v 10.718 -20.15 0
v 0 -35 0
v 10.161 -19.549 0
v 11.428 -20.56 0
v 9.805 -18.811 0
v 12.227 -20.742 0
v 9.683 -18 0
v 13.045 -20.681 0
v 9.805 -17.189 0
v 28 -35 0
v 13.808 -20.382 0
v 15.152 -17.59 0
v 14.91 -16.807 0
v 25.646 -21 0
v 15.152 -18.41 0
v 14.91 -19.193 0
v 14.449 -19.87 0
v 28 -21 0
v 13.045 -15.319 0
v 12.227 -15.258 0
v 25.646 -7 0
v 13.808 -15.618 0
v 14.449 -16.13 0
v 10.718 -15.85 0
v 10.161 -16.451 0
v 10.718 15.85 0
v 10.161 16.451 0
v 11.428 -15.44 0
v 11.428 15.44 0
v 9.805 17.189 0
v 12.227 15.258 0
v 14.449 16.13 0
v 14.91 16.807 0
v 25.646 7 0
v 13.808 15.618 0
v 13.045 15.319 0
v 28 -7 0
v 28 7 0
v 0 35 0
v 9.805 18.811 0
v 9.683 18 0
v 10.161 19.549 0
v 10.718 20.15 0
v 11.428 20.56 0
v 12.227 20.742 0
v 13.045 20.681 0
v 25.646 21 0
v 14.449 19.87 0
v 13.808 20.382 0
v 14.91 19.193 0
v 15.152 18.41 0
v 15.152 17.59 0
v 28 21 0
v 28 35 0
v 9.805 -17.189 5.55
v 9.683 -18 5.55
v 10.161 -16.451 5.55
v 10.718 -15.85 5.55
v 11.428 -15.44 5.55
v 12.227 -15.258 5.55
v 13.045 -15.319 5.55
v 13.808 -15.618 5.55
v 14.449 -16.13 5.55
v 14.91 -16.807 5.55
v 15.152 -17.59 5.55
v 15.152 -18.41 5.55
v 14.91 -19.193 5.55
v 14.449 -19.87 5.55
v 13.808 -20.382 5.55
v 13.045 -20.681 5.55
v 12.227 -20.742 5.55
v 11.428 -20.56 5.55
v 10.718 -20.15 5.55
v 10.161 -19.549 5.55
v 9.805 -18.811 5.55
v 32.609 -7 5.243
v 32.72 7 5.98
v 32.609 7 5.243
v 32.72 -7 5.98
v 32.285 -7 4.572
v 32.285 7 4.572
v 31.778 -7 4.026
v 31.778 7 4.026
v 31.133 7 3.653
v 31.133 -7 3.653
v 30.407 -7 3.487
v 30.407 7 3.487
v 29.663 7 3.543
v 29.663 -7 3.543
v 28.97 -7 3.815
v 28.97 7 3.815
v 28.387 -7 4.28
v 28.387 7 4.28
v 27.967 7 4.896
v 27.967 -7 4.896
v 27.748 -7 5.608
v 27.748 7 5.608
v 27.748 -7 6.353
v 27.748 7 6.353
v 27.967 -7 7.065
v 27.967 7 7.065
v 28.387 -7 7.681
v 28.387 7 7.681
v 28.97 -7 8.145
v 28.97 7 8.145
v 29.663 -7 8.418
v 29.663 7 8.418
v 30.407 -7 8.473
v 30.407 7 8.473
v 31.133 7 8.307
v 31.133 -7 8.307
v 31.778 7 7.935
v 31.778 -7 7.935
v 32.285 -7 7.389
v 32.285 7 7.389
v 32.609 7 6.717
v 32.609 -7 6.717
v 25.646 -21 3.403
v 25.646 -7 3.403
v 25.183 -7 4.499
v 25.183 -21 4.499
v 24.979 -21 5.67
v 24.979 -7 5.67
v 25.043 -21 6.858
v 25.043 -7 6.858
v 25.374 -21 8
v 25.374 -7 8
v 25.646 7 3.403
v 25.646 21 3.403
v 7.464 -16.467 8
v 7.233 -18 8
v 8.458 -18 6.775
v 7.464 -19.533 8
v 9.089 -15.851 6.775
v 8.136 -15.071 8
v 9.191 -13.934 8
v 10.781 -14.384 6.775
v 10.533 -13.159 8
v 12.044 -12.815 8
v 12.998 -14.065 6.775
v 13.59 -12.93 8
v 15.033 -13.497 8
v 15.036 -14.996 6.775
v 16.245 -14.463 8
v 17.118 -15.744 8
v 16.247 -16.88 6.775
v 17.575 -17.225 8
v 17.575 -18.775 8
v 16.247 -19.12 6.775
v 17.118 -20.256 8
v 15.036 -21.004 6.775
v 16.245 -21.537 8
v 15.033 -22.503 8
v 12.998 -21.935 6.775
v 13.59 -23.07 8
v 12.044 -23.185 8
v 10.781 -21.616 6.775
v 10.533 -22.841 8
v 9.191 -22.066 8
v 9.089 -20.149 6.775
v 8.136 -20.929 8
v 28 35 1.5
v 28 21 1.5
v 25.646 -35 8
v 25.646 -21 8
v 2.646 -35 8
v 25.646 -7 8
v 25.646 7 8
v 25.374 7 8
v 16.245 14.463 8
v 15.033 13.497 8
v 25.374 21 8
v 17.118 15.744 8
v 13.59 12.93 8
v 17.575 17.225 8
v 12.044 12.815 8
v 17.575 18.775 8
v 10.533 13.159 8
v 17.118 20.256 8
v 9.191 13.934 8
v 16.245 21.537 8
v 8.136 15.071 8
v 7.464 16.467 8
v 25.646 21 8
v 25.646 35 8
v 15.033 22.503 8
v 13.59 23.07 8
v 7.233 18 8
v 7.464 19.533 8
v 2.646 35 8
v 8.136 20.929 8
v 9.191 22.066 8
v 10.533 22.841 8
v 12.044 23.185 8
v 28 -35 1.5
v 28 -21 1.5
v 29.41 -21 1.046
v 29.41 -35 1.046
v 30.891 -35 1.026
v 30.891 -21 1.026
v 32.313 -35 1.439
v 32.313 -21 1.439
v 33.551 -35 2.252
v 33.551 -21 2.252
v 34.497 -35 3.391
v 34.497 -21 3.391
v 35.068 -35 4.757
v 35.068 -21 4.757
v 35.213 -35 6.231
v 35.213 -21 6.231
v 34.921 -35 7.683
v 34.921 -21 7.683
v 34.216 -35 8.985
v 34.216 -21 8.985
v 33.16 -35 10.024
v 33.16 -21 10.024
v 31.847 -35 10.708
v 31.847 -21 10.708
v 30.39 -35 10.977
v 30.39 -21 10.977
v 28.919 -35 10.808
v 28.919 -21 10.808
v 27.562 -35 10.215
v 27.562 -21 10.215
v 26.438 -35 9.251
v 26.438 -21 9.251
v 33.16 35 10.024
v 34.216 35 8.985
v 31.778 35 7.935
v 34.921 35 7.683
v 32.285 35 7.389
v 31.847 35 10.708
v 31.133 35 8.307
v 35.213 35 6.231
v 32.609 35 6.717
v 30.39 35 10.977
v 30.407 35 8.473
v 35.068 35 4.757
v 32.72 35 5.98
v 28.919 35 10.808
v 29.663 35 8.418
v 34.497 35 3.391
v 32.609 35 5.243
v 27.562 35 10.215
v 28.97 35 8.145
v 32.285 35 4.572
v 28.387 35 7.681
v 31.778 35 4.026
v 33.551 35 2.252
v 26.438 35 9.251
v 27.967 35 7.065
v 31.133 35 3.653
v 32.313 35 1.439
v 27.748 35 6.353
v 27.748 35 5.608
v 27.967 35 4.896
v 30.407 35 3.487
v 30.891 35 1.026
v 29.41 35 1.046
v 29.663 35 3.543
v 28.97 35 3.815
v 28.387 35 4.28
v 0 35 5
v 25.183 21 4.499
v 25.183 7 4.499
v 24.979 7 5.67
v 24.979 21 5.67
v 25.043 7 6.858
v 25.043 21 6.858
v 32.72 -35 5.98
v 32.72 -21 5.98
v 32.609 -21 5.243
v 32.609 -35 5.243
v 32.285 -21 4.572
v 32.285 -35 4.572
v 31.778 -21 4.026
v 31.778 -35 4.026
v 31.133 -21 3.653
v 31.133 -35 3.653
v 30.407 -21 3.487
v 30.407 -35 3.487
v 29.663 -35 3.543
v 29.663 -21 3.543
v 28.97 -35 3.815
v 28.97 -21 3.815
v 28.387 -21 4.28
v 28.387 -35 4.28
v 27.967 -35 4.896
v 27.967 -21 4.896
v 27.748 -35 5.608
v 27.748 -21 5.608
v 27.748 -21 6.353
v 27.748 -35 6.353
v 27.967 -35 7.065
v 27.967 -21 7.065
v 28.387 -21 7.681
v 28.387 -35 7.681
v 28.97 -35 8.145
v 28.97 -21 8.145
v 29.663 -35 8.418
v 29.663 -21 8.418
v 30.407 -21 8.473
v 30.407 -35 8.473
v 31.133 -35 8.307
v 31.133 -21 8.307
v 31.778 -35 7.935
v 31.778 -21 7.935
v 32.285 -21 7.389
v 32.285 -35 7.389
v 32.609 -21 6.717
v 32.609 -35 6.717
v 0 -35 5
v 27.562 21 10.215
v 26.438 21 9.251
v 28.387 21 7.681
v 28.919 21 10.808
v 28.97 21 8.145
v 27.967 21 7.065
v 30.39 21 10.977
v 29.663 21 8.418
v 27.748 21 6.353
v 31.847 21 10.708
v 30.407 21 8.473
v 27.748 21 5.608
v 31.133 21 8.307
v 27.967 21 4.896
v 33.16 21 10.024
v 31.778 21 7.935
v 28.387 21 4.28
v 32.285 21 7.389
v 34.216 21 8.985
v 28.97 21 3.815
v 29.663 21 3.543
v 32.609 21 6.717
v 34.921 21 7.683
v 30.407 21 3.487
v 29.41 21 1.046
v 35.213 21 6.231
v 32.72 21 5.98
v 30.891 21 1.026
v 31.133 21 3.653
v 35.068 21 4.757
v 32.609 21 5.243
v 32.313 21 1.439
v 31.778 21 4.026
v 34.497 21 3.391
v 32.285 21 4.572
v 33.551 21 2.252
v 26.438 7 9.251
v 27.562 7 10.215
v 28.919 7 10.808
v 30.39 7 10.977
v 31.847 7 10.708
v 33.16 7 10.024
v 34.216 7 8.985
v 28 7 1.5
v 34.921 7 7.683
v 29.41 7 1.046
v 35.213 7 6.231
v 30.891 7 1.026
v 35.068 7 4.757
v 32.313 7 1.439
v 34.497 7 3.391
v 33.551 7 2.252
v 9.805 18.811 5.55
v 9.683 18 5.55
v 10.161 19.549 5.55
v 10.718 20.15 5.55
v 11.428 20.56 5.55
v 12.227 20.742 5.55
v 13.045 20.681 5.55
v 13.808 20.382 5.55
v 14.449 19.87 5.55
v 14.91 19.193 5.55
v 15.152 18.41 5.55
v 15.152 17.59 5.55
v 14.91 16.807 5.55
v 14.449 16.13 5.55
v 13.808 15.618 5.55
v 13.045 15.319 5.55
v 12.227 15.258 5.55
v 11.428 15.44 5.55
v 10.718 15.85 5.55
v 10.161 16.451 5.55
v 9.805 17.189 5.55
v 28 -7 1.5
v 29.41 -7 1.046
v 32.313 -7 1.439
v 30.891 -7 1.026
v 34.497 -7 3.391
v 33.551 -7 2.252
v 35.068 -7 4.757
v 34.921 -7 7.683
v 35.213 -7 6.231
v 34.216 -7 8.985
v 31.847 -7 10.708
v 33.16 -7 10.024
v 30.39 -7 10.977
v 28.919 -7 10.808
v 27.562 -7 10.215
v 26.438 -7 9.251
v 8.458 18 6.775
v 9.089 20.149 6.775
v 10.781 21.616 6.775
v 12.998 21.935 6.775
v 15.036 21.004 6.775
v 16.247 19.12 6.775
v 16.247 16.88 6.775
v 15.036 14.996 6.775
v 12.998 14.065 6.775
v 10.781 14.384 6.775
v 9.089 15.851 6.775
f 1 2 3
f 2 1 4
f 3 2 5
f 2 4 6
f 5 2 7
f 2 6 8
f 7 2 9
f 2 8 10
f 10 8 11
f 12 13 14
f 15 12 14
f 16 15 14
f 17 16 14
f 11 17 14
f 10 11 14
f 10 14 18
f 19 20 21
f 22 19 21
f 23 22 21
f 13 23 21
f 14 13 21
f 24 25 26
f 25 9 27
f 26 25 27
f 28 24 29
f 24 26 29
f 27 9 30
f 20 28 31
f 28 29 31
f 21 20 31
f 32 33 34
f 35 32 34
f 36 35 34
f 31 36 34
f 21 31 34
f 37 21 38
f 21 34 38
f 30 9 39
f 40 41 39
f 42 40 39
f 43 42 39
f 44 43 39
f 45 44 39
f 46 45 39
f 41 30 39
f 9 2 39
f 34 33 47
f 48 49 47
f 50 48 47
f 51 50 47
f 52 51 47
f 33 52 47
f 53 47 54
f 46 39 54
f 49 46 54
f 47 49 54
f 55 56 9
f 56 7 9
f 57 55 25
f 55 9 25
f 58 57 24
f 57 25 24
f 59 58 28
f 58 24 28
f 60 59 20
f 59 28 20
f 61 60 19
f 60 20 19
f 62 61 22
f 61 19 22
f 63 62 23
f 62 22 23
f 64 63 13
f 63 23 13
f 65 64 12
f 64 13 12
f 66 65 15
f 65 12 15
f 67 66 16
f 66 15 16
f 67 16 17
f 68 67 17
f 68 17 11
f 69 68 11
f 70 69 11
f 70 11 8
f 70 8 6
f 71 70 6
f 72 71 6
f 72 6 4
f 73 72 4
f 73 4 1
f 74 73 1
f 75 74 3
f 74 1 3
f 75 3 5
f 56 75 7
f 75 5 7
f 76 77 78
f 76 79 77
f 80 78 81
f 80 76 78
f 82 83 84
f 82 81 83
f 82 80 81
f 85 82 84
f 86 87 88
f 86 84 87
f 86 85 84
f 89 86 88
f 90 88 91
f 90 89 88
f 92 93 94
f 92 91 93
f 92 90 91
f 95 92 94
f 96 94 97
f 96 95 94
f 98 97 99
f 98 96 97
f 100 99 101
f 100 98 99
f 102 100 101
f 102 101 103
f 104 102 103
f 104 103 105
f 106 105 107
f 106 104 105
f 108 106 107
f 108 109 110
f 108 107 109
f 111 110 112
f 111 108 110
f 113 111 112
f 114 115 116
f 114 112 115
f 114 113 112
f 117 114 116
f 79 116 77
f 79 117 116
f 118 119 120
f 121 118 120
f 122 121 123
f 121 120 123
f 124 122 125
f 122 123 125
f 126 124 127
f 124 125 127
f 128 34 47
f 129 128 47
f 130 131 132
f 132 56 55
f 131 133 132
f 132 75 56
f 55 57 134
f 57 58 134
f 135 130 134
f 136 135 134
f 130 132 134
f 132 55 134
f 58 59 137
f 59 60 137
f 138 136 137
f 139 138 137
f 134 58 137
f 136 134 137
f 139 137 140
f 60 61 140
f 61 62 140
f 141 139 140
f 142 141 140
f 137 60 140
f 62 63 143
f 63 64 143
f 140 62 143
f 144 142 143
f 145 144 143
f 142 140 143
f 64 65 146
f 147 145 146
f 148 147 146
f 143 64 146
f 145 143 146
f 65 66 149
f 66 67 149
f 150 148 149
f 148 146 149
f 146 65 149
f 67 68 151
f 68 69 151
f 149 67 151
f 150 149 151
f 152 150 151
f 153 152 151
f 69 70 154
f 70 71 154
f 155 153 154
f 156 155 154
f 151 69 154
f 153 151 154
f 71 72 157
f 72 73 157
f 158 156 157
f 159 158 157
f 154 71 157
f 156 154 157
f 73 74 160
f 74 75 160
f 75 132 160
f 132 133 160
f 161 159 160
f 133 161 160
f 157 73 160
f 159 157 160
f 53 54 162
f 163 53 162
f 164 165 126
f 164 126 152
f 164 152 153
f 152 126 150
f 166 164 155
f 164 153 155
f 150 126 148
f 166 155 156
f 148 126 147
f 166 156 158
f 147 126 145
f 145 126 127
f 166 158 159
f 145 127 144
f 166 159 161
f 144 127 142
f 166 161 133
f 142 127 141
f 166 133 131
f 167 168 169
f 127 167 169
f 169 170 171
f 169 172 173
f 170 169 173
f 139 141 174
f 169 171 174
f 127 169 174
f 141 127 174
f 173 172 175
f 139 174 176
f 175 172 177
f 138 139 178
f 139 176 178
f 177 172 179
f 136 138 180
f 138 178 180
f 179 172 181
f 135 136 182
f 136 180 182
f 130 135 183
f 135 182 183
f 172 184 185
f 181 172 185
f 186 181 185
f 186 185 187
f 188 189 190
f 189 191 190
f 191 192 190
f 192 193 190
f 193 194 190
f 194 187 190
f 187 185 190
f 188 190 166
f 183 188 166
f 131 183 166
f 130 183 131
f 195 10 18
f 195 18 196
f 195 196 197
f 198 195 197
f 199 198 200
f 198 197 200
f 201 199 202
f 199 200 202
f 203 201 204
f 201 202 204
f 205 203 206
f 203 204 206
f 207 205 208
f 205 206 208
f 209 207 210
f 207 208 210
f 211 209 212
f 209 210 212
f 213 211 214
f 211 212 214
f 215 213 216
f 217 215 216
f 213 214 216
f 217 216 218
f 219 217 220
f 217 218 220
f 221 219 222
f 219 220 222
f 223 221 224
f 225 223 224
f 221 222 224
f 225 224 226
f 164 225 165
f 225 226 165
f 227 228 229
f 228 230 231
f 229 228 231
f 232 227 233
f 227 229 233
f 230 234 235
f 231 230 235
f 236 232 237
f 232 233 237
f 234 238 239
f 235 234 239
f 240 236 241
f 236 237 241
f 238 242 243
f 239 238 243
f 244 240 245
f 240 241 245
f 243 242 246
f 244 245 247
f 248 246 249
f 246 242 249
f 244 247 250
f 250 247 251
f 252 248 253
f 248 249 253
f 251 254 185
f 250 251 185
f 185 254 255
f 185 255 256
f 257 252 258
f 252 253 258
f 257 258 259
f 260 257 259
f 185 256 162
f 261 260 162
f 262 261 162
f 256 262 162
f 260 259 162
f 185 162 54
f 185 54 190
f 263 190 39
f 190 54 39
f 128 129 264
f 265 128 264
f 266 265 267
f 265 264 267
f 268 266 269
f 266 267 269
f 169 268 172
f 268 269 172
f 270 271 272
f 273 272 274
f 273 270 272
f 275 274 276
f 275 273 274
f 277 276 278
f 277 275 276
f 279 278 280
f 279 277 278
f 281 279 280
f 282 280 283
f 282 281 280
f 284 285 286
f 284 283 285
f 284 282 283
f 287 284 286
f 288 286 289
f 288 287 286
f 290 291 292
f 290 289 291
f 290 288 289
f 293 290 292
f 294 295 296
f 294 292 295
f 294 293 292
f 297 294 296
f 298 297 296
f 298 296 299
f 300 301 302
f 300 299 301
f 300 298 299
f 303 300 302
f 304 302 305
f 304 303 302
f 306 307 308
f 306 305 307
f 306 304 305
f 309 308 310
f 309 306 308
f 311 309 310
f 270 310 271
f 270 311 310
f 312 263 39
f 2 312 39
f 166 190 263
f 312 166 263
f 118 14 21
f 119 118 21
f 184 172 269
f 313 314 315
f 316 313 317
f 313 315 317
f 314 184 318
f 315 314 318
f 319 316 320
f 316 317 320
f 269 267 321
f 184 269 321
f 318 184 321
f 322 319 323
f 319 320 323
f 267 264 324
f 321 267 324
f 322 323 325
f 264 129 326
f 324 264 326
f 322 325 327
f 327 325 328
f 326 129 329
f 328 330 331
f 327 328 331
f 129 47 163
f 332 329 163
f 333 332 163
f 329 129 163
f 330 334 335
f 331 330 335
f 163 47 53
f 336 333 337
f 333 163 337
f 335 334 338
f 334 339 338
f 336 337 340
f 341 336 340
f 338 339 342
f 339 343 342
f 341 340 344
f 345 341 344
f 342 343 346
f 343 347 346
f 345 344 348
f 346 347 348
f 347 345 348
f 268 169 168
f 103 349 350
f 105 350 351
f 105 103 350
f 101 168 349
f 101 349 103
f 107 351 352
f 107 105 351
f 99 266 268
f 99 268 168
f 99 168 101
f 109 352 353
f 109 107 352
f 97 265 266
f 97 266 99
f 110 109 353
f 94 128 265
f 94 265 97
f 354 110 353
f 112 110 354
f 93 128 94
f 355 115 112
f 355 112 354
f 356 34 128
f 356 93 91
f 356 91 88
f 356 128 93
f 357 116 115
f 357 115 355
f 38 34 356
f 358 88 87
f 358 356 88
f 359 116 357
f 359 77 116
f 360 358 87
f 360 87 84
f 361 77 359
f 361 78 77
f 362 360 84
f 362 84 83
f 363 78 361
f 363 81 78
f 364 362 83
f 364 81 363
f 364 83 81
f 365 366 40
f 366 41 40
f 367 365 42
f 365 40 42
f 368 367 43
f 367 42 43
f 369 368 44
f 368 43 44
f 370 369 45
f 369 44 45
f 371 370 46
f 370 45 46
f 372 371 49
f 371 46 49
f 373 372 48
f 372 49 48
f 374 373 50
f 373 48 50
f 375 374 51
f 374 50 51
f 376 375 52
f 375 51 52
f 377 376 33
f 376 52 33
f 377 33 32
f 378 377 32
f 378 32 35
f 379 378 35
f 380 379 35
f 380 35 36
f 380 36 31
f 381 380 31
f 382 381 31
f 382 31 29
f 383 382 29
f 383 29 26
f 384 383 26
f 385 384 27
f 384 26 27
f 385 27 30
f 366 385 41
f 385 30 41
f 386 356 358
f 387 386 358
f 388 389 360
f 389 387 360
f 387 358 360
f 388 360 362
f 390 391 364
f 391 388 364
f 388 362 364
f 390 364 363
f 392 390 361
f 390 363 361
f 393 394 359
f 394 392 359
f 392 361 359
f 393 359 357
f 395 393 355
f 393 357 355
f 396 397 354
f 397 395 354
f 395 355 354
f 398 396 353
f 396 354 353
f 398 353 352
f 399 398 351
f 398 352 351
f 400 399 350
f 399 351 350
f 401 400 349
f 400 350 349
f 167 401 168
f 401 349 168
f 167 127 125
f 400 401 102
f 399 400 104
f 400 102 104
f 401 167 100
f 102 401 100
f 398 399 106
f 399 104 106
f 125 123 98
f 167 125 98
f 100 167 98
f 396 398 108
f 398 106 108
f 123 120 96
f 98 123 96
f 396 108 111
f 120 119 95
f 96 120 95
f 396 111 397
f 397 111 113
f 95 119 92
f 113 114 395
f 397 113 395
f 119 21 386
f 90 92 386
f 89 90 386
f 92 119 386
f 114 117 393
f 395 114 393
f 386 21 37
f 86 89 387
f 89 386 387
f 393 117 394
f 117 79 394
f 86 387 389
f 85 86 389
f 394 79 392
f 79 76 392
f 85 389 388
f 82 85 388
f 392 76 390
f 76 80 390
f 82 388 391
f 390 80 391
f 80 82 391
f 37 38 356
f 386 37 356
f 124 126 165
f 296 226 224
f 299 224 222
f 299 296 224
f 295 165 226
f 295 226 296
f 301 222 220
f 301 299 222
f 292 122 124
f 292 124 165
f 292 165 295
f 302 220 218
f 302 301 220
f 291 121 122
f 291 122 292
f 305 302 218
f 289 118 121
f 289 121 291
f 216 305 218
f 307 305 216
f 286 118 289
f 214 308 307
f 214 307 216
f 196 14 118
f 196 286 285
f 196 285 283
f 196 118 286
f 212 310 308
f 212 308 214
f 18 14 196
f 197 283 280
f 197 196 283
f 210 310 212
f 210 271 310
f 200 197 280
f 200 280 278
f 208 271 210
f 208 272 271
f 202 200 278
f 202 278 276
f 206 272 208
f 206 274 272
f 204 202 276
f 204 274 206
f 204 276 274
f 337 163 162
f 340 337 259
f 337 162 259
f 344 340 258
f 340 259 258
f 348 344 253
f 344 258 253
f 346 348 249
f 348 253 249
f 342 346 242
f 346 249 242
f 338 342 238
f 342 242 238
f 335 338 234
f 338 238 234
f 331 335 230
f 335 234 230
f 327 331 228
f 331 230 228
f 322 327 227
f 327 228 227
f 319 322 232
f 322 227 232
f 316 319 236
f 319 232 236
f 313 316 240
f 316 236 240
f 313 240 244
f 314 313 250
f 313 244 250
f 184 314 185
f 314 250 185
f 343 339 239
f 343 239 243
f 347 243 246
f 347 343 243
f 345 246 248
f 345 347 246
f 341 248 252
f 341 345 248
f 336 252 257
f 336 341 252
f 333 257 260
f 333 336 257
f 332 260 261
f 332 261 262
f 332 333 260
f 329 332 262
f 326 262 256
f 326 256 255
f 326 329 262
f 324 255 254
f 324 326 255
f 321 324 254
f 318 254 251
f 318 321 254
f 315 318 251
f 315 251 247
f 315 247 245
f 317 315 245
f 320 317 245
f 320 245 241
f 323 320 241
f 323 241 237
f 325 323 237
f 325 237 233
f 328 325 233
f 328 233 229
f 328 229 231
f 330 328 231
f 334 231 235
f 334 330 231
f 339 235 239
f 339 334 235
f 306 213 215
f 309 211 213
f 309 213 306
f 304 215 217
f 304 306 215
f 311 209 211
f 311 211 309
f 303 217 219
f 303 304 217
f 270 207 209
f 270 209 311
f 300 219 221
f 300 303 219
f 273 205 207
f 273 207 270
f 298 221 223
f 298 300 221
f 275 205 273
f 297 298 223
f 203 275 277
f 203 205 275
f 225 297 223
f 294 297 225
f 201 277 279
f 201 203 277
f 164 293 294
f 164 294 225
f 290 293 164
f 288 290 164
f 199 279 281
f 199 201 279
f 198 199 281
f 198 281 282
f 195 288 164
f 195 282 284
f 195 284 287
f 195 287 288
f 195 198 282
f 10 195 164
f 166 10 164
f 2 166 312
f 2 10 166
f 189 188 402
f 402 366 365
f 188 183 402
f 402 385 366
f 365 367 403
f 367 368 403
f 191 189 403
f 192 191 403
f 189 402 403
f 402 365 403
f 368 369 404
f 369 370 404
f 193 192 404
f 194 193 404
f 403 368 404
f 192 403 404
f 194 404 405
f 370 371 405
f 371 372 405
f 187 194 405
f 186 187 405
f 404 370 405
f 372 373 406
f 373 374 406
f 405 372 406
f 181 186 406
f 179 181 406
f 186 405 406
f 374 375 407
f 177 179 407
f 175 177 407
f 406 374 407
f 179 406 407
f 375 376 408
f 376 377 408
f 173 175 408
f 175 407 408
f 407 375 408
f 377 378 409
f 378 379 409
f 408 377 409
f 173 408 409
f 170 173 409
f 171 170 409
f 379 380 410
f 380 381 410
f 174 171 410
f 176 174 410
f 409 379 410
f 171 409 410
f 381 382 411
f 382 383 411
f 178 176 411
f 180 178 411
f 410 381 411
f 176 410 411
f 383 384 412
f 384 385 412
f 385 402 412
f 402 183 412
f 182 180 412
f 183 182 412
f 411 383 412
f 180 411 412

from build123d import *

# Parameters (mm, degrees)
SKETCH1_R                                       = 2.5
BOSS_EXTRUDE1_DEPTH                             = 35
SKETCH2_W                                       = 19.147849822
SKETCH2_H                                       = 14
CUT_EXTRUDE1_DEPTH                              = 11.980294351
CUT_EXTRUDE1_DEPTH_BACK                         = 1
CSK_FOR_M5_FLAT_HEAD_MACHINE_SCREW1_D           = 5.5
CSK_FOR_M5_FLAT_HEAD_MACHINE_SCREW1_DEPTH       = 13.347633298
CSK_FOR_M5_FLAT_HEAD_MACHINE_SCREW1_CSINK_D     = 10.4
CSK_FOR_M5_FLAT_HEAD_MACHINE_SCREW1_CSINK_ANGLE = 90
CSK_FOR_M5_FLAT_HEAD_MACHINE_SCREW1_TIP         = 1.652366702
CUT_EXTRUDE2_START                              = -14
SKETCH6_R                                       = 5.25
CUT_EXTRUDE2_DEPTH                              = 14
CUT_EXTRUDE3_START                              = -42
SKETCH6_2_R                                     = 5.25
CUT_EXTRUDE3_DEPTH                              = 14


with BuildPart() as part:
    # Sketch1 → Boss-Extrude1 (new body, symmetric)
    with BuildSketch(Plane(origin=(0, 0, 0), x_dir=(1, 0, 0), z_dir=(0, 1, 0))):
        with BuildLine():
            Line((0, 0), (28, 0))
            Line((28, 0), (28, -1.5))
            ThreePointArc((28, -1.5), (34.920820135, -7.683011565), (25.645751311, -8))
            Line((25.645751311, -8), (2.645751311, -8))
            Line((2.645751311, -8), (0, -5))
            Line((0, -5), (0, 0))
        make_face()
        with Locations((30.219676222, -5.980294351)):
            Circle(SKETCH1_R, mode=Mode.SUBTRACT)
    extrude(amount=BOSS_EXTRUDE1_DEPTH, both=True)

    # Sketch2 → Cut-Extrude1 (cut, two sides)
    with BuildSketch(Plane.XY) as cut_extrude1_sk:
        with Locations((35.219676222, 14)):
            Rectangle(SKETCH2_W, SKETCH2_H)
        with Locations((35.219676222, -14)):
            Rectangle(SKETCH2_W, SKETCH2_H)
    extrude(amount=CUT_EXTRUDE1_DEPTH, mode=Mode.SUBTRACT)
    extrude(cut_extrude1_sk.sketch, amount=-CUT_EXTRUDE1_DEPTH_BACK, mode=Mode.SUBTRACT)

    # CSK for M5 Flat Head Machine Screw1
    with Locations(Plane.XY.offset(8)):
        with Locations((12.432713767, 18), (12.432713767, -18)):
            CounterSinkHole(CSK_FOR_M5_FLAT_HEAD_MACHINE_SCREW1_D / 2, CSK_FOR_M5_FLAT_HEAD_MACHINE_SCREW1_CSINK_D / 2, depth=CSK_FOR_M5_FLAT_HEAD_MACHINE_SCREW1_DEPTH, counter_sink_angle=CSK_FOR_M5_FLAT_HEAD_MACHINE_SCREW1_CSINK_ANGLE)
            with Locations((0, 0, -(CSK_FOR_M5_FLAT_HEAD_MACHINE_SCREW1_DEPTH + CSK_FOR_M5_FLAT_HEAD_MACHINE_SCREW1_TIP / 2))):  # 118° drill point
                Cone(0, CSK_FOR_M5_FLAT_HEAD_MACHINE_SCREW1_D / 2, CSK_FOR_M5_FLAT_HEAD_MACHINE_SCREW1_TIP, mode=Mode.SUBTRACT)

    # Sketch6 → Cut-Extrude2 (cut)
    with BuildSketch(Plane(origin=(0, 35, 0), x_dir=(1, 0, 0), z_dir=(0, 1, 0)).offset(CUT_EXTRUDE2_START)):
        with Locations((30.219676222, -5.980294351)):
            Circle(SKETCH6_R)
    extrude(amount=-CUT_EXTRUDE2_DEPTH, mode=Mode.SUBTRACT)

    # Sketch6<2> → Cut-Extrude3 (cut)
    with BuildSketch(Plane(origin=(0, 35, 0), x_dir=(1, 0, 0), z_dir=(0, 1, 0)).offset(CUT_EXTRUDE3_START)):
        with Locations((30.219676222, -5.980294351)):
            Circle(SKETCH6_2_R)
    extrude(amount=-CUT_EXTRUDE3_DEPTH, mode=Mode.SUBTRACT)


solid = part.part
